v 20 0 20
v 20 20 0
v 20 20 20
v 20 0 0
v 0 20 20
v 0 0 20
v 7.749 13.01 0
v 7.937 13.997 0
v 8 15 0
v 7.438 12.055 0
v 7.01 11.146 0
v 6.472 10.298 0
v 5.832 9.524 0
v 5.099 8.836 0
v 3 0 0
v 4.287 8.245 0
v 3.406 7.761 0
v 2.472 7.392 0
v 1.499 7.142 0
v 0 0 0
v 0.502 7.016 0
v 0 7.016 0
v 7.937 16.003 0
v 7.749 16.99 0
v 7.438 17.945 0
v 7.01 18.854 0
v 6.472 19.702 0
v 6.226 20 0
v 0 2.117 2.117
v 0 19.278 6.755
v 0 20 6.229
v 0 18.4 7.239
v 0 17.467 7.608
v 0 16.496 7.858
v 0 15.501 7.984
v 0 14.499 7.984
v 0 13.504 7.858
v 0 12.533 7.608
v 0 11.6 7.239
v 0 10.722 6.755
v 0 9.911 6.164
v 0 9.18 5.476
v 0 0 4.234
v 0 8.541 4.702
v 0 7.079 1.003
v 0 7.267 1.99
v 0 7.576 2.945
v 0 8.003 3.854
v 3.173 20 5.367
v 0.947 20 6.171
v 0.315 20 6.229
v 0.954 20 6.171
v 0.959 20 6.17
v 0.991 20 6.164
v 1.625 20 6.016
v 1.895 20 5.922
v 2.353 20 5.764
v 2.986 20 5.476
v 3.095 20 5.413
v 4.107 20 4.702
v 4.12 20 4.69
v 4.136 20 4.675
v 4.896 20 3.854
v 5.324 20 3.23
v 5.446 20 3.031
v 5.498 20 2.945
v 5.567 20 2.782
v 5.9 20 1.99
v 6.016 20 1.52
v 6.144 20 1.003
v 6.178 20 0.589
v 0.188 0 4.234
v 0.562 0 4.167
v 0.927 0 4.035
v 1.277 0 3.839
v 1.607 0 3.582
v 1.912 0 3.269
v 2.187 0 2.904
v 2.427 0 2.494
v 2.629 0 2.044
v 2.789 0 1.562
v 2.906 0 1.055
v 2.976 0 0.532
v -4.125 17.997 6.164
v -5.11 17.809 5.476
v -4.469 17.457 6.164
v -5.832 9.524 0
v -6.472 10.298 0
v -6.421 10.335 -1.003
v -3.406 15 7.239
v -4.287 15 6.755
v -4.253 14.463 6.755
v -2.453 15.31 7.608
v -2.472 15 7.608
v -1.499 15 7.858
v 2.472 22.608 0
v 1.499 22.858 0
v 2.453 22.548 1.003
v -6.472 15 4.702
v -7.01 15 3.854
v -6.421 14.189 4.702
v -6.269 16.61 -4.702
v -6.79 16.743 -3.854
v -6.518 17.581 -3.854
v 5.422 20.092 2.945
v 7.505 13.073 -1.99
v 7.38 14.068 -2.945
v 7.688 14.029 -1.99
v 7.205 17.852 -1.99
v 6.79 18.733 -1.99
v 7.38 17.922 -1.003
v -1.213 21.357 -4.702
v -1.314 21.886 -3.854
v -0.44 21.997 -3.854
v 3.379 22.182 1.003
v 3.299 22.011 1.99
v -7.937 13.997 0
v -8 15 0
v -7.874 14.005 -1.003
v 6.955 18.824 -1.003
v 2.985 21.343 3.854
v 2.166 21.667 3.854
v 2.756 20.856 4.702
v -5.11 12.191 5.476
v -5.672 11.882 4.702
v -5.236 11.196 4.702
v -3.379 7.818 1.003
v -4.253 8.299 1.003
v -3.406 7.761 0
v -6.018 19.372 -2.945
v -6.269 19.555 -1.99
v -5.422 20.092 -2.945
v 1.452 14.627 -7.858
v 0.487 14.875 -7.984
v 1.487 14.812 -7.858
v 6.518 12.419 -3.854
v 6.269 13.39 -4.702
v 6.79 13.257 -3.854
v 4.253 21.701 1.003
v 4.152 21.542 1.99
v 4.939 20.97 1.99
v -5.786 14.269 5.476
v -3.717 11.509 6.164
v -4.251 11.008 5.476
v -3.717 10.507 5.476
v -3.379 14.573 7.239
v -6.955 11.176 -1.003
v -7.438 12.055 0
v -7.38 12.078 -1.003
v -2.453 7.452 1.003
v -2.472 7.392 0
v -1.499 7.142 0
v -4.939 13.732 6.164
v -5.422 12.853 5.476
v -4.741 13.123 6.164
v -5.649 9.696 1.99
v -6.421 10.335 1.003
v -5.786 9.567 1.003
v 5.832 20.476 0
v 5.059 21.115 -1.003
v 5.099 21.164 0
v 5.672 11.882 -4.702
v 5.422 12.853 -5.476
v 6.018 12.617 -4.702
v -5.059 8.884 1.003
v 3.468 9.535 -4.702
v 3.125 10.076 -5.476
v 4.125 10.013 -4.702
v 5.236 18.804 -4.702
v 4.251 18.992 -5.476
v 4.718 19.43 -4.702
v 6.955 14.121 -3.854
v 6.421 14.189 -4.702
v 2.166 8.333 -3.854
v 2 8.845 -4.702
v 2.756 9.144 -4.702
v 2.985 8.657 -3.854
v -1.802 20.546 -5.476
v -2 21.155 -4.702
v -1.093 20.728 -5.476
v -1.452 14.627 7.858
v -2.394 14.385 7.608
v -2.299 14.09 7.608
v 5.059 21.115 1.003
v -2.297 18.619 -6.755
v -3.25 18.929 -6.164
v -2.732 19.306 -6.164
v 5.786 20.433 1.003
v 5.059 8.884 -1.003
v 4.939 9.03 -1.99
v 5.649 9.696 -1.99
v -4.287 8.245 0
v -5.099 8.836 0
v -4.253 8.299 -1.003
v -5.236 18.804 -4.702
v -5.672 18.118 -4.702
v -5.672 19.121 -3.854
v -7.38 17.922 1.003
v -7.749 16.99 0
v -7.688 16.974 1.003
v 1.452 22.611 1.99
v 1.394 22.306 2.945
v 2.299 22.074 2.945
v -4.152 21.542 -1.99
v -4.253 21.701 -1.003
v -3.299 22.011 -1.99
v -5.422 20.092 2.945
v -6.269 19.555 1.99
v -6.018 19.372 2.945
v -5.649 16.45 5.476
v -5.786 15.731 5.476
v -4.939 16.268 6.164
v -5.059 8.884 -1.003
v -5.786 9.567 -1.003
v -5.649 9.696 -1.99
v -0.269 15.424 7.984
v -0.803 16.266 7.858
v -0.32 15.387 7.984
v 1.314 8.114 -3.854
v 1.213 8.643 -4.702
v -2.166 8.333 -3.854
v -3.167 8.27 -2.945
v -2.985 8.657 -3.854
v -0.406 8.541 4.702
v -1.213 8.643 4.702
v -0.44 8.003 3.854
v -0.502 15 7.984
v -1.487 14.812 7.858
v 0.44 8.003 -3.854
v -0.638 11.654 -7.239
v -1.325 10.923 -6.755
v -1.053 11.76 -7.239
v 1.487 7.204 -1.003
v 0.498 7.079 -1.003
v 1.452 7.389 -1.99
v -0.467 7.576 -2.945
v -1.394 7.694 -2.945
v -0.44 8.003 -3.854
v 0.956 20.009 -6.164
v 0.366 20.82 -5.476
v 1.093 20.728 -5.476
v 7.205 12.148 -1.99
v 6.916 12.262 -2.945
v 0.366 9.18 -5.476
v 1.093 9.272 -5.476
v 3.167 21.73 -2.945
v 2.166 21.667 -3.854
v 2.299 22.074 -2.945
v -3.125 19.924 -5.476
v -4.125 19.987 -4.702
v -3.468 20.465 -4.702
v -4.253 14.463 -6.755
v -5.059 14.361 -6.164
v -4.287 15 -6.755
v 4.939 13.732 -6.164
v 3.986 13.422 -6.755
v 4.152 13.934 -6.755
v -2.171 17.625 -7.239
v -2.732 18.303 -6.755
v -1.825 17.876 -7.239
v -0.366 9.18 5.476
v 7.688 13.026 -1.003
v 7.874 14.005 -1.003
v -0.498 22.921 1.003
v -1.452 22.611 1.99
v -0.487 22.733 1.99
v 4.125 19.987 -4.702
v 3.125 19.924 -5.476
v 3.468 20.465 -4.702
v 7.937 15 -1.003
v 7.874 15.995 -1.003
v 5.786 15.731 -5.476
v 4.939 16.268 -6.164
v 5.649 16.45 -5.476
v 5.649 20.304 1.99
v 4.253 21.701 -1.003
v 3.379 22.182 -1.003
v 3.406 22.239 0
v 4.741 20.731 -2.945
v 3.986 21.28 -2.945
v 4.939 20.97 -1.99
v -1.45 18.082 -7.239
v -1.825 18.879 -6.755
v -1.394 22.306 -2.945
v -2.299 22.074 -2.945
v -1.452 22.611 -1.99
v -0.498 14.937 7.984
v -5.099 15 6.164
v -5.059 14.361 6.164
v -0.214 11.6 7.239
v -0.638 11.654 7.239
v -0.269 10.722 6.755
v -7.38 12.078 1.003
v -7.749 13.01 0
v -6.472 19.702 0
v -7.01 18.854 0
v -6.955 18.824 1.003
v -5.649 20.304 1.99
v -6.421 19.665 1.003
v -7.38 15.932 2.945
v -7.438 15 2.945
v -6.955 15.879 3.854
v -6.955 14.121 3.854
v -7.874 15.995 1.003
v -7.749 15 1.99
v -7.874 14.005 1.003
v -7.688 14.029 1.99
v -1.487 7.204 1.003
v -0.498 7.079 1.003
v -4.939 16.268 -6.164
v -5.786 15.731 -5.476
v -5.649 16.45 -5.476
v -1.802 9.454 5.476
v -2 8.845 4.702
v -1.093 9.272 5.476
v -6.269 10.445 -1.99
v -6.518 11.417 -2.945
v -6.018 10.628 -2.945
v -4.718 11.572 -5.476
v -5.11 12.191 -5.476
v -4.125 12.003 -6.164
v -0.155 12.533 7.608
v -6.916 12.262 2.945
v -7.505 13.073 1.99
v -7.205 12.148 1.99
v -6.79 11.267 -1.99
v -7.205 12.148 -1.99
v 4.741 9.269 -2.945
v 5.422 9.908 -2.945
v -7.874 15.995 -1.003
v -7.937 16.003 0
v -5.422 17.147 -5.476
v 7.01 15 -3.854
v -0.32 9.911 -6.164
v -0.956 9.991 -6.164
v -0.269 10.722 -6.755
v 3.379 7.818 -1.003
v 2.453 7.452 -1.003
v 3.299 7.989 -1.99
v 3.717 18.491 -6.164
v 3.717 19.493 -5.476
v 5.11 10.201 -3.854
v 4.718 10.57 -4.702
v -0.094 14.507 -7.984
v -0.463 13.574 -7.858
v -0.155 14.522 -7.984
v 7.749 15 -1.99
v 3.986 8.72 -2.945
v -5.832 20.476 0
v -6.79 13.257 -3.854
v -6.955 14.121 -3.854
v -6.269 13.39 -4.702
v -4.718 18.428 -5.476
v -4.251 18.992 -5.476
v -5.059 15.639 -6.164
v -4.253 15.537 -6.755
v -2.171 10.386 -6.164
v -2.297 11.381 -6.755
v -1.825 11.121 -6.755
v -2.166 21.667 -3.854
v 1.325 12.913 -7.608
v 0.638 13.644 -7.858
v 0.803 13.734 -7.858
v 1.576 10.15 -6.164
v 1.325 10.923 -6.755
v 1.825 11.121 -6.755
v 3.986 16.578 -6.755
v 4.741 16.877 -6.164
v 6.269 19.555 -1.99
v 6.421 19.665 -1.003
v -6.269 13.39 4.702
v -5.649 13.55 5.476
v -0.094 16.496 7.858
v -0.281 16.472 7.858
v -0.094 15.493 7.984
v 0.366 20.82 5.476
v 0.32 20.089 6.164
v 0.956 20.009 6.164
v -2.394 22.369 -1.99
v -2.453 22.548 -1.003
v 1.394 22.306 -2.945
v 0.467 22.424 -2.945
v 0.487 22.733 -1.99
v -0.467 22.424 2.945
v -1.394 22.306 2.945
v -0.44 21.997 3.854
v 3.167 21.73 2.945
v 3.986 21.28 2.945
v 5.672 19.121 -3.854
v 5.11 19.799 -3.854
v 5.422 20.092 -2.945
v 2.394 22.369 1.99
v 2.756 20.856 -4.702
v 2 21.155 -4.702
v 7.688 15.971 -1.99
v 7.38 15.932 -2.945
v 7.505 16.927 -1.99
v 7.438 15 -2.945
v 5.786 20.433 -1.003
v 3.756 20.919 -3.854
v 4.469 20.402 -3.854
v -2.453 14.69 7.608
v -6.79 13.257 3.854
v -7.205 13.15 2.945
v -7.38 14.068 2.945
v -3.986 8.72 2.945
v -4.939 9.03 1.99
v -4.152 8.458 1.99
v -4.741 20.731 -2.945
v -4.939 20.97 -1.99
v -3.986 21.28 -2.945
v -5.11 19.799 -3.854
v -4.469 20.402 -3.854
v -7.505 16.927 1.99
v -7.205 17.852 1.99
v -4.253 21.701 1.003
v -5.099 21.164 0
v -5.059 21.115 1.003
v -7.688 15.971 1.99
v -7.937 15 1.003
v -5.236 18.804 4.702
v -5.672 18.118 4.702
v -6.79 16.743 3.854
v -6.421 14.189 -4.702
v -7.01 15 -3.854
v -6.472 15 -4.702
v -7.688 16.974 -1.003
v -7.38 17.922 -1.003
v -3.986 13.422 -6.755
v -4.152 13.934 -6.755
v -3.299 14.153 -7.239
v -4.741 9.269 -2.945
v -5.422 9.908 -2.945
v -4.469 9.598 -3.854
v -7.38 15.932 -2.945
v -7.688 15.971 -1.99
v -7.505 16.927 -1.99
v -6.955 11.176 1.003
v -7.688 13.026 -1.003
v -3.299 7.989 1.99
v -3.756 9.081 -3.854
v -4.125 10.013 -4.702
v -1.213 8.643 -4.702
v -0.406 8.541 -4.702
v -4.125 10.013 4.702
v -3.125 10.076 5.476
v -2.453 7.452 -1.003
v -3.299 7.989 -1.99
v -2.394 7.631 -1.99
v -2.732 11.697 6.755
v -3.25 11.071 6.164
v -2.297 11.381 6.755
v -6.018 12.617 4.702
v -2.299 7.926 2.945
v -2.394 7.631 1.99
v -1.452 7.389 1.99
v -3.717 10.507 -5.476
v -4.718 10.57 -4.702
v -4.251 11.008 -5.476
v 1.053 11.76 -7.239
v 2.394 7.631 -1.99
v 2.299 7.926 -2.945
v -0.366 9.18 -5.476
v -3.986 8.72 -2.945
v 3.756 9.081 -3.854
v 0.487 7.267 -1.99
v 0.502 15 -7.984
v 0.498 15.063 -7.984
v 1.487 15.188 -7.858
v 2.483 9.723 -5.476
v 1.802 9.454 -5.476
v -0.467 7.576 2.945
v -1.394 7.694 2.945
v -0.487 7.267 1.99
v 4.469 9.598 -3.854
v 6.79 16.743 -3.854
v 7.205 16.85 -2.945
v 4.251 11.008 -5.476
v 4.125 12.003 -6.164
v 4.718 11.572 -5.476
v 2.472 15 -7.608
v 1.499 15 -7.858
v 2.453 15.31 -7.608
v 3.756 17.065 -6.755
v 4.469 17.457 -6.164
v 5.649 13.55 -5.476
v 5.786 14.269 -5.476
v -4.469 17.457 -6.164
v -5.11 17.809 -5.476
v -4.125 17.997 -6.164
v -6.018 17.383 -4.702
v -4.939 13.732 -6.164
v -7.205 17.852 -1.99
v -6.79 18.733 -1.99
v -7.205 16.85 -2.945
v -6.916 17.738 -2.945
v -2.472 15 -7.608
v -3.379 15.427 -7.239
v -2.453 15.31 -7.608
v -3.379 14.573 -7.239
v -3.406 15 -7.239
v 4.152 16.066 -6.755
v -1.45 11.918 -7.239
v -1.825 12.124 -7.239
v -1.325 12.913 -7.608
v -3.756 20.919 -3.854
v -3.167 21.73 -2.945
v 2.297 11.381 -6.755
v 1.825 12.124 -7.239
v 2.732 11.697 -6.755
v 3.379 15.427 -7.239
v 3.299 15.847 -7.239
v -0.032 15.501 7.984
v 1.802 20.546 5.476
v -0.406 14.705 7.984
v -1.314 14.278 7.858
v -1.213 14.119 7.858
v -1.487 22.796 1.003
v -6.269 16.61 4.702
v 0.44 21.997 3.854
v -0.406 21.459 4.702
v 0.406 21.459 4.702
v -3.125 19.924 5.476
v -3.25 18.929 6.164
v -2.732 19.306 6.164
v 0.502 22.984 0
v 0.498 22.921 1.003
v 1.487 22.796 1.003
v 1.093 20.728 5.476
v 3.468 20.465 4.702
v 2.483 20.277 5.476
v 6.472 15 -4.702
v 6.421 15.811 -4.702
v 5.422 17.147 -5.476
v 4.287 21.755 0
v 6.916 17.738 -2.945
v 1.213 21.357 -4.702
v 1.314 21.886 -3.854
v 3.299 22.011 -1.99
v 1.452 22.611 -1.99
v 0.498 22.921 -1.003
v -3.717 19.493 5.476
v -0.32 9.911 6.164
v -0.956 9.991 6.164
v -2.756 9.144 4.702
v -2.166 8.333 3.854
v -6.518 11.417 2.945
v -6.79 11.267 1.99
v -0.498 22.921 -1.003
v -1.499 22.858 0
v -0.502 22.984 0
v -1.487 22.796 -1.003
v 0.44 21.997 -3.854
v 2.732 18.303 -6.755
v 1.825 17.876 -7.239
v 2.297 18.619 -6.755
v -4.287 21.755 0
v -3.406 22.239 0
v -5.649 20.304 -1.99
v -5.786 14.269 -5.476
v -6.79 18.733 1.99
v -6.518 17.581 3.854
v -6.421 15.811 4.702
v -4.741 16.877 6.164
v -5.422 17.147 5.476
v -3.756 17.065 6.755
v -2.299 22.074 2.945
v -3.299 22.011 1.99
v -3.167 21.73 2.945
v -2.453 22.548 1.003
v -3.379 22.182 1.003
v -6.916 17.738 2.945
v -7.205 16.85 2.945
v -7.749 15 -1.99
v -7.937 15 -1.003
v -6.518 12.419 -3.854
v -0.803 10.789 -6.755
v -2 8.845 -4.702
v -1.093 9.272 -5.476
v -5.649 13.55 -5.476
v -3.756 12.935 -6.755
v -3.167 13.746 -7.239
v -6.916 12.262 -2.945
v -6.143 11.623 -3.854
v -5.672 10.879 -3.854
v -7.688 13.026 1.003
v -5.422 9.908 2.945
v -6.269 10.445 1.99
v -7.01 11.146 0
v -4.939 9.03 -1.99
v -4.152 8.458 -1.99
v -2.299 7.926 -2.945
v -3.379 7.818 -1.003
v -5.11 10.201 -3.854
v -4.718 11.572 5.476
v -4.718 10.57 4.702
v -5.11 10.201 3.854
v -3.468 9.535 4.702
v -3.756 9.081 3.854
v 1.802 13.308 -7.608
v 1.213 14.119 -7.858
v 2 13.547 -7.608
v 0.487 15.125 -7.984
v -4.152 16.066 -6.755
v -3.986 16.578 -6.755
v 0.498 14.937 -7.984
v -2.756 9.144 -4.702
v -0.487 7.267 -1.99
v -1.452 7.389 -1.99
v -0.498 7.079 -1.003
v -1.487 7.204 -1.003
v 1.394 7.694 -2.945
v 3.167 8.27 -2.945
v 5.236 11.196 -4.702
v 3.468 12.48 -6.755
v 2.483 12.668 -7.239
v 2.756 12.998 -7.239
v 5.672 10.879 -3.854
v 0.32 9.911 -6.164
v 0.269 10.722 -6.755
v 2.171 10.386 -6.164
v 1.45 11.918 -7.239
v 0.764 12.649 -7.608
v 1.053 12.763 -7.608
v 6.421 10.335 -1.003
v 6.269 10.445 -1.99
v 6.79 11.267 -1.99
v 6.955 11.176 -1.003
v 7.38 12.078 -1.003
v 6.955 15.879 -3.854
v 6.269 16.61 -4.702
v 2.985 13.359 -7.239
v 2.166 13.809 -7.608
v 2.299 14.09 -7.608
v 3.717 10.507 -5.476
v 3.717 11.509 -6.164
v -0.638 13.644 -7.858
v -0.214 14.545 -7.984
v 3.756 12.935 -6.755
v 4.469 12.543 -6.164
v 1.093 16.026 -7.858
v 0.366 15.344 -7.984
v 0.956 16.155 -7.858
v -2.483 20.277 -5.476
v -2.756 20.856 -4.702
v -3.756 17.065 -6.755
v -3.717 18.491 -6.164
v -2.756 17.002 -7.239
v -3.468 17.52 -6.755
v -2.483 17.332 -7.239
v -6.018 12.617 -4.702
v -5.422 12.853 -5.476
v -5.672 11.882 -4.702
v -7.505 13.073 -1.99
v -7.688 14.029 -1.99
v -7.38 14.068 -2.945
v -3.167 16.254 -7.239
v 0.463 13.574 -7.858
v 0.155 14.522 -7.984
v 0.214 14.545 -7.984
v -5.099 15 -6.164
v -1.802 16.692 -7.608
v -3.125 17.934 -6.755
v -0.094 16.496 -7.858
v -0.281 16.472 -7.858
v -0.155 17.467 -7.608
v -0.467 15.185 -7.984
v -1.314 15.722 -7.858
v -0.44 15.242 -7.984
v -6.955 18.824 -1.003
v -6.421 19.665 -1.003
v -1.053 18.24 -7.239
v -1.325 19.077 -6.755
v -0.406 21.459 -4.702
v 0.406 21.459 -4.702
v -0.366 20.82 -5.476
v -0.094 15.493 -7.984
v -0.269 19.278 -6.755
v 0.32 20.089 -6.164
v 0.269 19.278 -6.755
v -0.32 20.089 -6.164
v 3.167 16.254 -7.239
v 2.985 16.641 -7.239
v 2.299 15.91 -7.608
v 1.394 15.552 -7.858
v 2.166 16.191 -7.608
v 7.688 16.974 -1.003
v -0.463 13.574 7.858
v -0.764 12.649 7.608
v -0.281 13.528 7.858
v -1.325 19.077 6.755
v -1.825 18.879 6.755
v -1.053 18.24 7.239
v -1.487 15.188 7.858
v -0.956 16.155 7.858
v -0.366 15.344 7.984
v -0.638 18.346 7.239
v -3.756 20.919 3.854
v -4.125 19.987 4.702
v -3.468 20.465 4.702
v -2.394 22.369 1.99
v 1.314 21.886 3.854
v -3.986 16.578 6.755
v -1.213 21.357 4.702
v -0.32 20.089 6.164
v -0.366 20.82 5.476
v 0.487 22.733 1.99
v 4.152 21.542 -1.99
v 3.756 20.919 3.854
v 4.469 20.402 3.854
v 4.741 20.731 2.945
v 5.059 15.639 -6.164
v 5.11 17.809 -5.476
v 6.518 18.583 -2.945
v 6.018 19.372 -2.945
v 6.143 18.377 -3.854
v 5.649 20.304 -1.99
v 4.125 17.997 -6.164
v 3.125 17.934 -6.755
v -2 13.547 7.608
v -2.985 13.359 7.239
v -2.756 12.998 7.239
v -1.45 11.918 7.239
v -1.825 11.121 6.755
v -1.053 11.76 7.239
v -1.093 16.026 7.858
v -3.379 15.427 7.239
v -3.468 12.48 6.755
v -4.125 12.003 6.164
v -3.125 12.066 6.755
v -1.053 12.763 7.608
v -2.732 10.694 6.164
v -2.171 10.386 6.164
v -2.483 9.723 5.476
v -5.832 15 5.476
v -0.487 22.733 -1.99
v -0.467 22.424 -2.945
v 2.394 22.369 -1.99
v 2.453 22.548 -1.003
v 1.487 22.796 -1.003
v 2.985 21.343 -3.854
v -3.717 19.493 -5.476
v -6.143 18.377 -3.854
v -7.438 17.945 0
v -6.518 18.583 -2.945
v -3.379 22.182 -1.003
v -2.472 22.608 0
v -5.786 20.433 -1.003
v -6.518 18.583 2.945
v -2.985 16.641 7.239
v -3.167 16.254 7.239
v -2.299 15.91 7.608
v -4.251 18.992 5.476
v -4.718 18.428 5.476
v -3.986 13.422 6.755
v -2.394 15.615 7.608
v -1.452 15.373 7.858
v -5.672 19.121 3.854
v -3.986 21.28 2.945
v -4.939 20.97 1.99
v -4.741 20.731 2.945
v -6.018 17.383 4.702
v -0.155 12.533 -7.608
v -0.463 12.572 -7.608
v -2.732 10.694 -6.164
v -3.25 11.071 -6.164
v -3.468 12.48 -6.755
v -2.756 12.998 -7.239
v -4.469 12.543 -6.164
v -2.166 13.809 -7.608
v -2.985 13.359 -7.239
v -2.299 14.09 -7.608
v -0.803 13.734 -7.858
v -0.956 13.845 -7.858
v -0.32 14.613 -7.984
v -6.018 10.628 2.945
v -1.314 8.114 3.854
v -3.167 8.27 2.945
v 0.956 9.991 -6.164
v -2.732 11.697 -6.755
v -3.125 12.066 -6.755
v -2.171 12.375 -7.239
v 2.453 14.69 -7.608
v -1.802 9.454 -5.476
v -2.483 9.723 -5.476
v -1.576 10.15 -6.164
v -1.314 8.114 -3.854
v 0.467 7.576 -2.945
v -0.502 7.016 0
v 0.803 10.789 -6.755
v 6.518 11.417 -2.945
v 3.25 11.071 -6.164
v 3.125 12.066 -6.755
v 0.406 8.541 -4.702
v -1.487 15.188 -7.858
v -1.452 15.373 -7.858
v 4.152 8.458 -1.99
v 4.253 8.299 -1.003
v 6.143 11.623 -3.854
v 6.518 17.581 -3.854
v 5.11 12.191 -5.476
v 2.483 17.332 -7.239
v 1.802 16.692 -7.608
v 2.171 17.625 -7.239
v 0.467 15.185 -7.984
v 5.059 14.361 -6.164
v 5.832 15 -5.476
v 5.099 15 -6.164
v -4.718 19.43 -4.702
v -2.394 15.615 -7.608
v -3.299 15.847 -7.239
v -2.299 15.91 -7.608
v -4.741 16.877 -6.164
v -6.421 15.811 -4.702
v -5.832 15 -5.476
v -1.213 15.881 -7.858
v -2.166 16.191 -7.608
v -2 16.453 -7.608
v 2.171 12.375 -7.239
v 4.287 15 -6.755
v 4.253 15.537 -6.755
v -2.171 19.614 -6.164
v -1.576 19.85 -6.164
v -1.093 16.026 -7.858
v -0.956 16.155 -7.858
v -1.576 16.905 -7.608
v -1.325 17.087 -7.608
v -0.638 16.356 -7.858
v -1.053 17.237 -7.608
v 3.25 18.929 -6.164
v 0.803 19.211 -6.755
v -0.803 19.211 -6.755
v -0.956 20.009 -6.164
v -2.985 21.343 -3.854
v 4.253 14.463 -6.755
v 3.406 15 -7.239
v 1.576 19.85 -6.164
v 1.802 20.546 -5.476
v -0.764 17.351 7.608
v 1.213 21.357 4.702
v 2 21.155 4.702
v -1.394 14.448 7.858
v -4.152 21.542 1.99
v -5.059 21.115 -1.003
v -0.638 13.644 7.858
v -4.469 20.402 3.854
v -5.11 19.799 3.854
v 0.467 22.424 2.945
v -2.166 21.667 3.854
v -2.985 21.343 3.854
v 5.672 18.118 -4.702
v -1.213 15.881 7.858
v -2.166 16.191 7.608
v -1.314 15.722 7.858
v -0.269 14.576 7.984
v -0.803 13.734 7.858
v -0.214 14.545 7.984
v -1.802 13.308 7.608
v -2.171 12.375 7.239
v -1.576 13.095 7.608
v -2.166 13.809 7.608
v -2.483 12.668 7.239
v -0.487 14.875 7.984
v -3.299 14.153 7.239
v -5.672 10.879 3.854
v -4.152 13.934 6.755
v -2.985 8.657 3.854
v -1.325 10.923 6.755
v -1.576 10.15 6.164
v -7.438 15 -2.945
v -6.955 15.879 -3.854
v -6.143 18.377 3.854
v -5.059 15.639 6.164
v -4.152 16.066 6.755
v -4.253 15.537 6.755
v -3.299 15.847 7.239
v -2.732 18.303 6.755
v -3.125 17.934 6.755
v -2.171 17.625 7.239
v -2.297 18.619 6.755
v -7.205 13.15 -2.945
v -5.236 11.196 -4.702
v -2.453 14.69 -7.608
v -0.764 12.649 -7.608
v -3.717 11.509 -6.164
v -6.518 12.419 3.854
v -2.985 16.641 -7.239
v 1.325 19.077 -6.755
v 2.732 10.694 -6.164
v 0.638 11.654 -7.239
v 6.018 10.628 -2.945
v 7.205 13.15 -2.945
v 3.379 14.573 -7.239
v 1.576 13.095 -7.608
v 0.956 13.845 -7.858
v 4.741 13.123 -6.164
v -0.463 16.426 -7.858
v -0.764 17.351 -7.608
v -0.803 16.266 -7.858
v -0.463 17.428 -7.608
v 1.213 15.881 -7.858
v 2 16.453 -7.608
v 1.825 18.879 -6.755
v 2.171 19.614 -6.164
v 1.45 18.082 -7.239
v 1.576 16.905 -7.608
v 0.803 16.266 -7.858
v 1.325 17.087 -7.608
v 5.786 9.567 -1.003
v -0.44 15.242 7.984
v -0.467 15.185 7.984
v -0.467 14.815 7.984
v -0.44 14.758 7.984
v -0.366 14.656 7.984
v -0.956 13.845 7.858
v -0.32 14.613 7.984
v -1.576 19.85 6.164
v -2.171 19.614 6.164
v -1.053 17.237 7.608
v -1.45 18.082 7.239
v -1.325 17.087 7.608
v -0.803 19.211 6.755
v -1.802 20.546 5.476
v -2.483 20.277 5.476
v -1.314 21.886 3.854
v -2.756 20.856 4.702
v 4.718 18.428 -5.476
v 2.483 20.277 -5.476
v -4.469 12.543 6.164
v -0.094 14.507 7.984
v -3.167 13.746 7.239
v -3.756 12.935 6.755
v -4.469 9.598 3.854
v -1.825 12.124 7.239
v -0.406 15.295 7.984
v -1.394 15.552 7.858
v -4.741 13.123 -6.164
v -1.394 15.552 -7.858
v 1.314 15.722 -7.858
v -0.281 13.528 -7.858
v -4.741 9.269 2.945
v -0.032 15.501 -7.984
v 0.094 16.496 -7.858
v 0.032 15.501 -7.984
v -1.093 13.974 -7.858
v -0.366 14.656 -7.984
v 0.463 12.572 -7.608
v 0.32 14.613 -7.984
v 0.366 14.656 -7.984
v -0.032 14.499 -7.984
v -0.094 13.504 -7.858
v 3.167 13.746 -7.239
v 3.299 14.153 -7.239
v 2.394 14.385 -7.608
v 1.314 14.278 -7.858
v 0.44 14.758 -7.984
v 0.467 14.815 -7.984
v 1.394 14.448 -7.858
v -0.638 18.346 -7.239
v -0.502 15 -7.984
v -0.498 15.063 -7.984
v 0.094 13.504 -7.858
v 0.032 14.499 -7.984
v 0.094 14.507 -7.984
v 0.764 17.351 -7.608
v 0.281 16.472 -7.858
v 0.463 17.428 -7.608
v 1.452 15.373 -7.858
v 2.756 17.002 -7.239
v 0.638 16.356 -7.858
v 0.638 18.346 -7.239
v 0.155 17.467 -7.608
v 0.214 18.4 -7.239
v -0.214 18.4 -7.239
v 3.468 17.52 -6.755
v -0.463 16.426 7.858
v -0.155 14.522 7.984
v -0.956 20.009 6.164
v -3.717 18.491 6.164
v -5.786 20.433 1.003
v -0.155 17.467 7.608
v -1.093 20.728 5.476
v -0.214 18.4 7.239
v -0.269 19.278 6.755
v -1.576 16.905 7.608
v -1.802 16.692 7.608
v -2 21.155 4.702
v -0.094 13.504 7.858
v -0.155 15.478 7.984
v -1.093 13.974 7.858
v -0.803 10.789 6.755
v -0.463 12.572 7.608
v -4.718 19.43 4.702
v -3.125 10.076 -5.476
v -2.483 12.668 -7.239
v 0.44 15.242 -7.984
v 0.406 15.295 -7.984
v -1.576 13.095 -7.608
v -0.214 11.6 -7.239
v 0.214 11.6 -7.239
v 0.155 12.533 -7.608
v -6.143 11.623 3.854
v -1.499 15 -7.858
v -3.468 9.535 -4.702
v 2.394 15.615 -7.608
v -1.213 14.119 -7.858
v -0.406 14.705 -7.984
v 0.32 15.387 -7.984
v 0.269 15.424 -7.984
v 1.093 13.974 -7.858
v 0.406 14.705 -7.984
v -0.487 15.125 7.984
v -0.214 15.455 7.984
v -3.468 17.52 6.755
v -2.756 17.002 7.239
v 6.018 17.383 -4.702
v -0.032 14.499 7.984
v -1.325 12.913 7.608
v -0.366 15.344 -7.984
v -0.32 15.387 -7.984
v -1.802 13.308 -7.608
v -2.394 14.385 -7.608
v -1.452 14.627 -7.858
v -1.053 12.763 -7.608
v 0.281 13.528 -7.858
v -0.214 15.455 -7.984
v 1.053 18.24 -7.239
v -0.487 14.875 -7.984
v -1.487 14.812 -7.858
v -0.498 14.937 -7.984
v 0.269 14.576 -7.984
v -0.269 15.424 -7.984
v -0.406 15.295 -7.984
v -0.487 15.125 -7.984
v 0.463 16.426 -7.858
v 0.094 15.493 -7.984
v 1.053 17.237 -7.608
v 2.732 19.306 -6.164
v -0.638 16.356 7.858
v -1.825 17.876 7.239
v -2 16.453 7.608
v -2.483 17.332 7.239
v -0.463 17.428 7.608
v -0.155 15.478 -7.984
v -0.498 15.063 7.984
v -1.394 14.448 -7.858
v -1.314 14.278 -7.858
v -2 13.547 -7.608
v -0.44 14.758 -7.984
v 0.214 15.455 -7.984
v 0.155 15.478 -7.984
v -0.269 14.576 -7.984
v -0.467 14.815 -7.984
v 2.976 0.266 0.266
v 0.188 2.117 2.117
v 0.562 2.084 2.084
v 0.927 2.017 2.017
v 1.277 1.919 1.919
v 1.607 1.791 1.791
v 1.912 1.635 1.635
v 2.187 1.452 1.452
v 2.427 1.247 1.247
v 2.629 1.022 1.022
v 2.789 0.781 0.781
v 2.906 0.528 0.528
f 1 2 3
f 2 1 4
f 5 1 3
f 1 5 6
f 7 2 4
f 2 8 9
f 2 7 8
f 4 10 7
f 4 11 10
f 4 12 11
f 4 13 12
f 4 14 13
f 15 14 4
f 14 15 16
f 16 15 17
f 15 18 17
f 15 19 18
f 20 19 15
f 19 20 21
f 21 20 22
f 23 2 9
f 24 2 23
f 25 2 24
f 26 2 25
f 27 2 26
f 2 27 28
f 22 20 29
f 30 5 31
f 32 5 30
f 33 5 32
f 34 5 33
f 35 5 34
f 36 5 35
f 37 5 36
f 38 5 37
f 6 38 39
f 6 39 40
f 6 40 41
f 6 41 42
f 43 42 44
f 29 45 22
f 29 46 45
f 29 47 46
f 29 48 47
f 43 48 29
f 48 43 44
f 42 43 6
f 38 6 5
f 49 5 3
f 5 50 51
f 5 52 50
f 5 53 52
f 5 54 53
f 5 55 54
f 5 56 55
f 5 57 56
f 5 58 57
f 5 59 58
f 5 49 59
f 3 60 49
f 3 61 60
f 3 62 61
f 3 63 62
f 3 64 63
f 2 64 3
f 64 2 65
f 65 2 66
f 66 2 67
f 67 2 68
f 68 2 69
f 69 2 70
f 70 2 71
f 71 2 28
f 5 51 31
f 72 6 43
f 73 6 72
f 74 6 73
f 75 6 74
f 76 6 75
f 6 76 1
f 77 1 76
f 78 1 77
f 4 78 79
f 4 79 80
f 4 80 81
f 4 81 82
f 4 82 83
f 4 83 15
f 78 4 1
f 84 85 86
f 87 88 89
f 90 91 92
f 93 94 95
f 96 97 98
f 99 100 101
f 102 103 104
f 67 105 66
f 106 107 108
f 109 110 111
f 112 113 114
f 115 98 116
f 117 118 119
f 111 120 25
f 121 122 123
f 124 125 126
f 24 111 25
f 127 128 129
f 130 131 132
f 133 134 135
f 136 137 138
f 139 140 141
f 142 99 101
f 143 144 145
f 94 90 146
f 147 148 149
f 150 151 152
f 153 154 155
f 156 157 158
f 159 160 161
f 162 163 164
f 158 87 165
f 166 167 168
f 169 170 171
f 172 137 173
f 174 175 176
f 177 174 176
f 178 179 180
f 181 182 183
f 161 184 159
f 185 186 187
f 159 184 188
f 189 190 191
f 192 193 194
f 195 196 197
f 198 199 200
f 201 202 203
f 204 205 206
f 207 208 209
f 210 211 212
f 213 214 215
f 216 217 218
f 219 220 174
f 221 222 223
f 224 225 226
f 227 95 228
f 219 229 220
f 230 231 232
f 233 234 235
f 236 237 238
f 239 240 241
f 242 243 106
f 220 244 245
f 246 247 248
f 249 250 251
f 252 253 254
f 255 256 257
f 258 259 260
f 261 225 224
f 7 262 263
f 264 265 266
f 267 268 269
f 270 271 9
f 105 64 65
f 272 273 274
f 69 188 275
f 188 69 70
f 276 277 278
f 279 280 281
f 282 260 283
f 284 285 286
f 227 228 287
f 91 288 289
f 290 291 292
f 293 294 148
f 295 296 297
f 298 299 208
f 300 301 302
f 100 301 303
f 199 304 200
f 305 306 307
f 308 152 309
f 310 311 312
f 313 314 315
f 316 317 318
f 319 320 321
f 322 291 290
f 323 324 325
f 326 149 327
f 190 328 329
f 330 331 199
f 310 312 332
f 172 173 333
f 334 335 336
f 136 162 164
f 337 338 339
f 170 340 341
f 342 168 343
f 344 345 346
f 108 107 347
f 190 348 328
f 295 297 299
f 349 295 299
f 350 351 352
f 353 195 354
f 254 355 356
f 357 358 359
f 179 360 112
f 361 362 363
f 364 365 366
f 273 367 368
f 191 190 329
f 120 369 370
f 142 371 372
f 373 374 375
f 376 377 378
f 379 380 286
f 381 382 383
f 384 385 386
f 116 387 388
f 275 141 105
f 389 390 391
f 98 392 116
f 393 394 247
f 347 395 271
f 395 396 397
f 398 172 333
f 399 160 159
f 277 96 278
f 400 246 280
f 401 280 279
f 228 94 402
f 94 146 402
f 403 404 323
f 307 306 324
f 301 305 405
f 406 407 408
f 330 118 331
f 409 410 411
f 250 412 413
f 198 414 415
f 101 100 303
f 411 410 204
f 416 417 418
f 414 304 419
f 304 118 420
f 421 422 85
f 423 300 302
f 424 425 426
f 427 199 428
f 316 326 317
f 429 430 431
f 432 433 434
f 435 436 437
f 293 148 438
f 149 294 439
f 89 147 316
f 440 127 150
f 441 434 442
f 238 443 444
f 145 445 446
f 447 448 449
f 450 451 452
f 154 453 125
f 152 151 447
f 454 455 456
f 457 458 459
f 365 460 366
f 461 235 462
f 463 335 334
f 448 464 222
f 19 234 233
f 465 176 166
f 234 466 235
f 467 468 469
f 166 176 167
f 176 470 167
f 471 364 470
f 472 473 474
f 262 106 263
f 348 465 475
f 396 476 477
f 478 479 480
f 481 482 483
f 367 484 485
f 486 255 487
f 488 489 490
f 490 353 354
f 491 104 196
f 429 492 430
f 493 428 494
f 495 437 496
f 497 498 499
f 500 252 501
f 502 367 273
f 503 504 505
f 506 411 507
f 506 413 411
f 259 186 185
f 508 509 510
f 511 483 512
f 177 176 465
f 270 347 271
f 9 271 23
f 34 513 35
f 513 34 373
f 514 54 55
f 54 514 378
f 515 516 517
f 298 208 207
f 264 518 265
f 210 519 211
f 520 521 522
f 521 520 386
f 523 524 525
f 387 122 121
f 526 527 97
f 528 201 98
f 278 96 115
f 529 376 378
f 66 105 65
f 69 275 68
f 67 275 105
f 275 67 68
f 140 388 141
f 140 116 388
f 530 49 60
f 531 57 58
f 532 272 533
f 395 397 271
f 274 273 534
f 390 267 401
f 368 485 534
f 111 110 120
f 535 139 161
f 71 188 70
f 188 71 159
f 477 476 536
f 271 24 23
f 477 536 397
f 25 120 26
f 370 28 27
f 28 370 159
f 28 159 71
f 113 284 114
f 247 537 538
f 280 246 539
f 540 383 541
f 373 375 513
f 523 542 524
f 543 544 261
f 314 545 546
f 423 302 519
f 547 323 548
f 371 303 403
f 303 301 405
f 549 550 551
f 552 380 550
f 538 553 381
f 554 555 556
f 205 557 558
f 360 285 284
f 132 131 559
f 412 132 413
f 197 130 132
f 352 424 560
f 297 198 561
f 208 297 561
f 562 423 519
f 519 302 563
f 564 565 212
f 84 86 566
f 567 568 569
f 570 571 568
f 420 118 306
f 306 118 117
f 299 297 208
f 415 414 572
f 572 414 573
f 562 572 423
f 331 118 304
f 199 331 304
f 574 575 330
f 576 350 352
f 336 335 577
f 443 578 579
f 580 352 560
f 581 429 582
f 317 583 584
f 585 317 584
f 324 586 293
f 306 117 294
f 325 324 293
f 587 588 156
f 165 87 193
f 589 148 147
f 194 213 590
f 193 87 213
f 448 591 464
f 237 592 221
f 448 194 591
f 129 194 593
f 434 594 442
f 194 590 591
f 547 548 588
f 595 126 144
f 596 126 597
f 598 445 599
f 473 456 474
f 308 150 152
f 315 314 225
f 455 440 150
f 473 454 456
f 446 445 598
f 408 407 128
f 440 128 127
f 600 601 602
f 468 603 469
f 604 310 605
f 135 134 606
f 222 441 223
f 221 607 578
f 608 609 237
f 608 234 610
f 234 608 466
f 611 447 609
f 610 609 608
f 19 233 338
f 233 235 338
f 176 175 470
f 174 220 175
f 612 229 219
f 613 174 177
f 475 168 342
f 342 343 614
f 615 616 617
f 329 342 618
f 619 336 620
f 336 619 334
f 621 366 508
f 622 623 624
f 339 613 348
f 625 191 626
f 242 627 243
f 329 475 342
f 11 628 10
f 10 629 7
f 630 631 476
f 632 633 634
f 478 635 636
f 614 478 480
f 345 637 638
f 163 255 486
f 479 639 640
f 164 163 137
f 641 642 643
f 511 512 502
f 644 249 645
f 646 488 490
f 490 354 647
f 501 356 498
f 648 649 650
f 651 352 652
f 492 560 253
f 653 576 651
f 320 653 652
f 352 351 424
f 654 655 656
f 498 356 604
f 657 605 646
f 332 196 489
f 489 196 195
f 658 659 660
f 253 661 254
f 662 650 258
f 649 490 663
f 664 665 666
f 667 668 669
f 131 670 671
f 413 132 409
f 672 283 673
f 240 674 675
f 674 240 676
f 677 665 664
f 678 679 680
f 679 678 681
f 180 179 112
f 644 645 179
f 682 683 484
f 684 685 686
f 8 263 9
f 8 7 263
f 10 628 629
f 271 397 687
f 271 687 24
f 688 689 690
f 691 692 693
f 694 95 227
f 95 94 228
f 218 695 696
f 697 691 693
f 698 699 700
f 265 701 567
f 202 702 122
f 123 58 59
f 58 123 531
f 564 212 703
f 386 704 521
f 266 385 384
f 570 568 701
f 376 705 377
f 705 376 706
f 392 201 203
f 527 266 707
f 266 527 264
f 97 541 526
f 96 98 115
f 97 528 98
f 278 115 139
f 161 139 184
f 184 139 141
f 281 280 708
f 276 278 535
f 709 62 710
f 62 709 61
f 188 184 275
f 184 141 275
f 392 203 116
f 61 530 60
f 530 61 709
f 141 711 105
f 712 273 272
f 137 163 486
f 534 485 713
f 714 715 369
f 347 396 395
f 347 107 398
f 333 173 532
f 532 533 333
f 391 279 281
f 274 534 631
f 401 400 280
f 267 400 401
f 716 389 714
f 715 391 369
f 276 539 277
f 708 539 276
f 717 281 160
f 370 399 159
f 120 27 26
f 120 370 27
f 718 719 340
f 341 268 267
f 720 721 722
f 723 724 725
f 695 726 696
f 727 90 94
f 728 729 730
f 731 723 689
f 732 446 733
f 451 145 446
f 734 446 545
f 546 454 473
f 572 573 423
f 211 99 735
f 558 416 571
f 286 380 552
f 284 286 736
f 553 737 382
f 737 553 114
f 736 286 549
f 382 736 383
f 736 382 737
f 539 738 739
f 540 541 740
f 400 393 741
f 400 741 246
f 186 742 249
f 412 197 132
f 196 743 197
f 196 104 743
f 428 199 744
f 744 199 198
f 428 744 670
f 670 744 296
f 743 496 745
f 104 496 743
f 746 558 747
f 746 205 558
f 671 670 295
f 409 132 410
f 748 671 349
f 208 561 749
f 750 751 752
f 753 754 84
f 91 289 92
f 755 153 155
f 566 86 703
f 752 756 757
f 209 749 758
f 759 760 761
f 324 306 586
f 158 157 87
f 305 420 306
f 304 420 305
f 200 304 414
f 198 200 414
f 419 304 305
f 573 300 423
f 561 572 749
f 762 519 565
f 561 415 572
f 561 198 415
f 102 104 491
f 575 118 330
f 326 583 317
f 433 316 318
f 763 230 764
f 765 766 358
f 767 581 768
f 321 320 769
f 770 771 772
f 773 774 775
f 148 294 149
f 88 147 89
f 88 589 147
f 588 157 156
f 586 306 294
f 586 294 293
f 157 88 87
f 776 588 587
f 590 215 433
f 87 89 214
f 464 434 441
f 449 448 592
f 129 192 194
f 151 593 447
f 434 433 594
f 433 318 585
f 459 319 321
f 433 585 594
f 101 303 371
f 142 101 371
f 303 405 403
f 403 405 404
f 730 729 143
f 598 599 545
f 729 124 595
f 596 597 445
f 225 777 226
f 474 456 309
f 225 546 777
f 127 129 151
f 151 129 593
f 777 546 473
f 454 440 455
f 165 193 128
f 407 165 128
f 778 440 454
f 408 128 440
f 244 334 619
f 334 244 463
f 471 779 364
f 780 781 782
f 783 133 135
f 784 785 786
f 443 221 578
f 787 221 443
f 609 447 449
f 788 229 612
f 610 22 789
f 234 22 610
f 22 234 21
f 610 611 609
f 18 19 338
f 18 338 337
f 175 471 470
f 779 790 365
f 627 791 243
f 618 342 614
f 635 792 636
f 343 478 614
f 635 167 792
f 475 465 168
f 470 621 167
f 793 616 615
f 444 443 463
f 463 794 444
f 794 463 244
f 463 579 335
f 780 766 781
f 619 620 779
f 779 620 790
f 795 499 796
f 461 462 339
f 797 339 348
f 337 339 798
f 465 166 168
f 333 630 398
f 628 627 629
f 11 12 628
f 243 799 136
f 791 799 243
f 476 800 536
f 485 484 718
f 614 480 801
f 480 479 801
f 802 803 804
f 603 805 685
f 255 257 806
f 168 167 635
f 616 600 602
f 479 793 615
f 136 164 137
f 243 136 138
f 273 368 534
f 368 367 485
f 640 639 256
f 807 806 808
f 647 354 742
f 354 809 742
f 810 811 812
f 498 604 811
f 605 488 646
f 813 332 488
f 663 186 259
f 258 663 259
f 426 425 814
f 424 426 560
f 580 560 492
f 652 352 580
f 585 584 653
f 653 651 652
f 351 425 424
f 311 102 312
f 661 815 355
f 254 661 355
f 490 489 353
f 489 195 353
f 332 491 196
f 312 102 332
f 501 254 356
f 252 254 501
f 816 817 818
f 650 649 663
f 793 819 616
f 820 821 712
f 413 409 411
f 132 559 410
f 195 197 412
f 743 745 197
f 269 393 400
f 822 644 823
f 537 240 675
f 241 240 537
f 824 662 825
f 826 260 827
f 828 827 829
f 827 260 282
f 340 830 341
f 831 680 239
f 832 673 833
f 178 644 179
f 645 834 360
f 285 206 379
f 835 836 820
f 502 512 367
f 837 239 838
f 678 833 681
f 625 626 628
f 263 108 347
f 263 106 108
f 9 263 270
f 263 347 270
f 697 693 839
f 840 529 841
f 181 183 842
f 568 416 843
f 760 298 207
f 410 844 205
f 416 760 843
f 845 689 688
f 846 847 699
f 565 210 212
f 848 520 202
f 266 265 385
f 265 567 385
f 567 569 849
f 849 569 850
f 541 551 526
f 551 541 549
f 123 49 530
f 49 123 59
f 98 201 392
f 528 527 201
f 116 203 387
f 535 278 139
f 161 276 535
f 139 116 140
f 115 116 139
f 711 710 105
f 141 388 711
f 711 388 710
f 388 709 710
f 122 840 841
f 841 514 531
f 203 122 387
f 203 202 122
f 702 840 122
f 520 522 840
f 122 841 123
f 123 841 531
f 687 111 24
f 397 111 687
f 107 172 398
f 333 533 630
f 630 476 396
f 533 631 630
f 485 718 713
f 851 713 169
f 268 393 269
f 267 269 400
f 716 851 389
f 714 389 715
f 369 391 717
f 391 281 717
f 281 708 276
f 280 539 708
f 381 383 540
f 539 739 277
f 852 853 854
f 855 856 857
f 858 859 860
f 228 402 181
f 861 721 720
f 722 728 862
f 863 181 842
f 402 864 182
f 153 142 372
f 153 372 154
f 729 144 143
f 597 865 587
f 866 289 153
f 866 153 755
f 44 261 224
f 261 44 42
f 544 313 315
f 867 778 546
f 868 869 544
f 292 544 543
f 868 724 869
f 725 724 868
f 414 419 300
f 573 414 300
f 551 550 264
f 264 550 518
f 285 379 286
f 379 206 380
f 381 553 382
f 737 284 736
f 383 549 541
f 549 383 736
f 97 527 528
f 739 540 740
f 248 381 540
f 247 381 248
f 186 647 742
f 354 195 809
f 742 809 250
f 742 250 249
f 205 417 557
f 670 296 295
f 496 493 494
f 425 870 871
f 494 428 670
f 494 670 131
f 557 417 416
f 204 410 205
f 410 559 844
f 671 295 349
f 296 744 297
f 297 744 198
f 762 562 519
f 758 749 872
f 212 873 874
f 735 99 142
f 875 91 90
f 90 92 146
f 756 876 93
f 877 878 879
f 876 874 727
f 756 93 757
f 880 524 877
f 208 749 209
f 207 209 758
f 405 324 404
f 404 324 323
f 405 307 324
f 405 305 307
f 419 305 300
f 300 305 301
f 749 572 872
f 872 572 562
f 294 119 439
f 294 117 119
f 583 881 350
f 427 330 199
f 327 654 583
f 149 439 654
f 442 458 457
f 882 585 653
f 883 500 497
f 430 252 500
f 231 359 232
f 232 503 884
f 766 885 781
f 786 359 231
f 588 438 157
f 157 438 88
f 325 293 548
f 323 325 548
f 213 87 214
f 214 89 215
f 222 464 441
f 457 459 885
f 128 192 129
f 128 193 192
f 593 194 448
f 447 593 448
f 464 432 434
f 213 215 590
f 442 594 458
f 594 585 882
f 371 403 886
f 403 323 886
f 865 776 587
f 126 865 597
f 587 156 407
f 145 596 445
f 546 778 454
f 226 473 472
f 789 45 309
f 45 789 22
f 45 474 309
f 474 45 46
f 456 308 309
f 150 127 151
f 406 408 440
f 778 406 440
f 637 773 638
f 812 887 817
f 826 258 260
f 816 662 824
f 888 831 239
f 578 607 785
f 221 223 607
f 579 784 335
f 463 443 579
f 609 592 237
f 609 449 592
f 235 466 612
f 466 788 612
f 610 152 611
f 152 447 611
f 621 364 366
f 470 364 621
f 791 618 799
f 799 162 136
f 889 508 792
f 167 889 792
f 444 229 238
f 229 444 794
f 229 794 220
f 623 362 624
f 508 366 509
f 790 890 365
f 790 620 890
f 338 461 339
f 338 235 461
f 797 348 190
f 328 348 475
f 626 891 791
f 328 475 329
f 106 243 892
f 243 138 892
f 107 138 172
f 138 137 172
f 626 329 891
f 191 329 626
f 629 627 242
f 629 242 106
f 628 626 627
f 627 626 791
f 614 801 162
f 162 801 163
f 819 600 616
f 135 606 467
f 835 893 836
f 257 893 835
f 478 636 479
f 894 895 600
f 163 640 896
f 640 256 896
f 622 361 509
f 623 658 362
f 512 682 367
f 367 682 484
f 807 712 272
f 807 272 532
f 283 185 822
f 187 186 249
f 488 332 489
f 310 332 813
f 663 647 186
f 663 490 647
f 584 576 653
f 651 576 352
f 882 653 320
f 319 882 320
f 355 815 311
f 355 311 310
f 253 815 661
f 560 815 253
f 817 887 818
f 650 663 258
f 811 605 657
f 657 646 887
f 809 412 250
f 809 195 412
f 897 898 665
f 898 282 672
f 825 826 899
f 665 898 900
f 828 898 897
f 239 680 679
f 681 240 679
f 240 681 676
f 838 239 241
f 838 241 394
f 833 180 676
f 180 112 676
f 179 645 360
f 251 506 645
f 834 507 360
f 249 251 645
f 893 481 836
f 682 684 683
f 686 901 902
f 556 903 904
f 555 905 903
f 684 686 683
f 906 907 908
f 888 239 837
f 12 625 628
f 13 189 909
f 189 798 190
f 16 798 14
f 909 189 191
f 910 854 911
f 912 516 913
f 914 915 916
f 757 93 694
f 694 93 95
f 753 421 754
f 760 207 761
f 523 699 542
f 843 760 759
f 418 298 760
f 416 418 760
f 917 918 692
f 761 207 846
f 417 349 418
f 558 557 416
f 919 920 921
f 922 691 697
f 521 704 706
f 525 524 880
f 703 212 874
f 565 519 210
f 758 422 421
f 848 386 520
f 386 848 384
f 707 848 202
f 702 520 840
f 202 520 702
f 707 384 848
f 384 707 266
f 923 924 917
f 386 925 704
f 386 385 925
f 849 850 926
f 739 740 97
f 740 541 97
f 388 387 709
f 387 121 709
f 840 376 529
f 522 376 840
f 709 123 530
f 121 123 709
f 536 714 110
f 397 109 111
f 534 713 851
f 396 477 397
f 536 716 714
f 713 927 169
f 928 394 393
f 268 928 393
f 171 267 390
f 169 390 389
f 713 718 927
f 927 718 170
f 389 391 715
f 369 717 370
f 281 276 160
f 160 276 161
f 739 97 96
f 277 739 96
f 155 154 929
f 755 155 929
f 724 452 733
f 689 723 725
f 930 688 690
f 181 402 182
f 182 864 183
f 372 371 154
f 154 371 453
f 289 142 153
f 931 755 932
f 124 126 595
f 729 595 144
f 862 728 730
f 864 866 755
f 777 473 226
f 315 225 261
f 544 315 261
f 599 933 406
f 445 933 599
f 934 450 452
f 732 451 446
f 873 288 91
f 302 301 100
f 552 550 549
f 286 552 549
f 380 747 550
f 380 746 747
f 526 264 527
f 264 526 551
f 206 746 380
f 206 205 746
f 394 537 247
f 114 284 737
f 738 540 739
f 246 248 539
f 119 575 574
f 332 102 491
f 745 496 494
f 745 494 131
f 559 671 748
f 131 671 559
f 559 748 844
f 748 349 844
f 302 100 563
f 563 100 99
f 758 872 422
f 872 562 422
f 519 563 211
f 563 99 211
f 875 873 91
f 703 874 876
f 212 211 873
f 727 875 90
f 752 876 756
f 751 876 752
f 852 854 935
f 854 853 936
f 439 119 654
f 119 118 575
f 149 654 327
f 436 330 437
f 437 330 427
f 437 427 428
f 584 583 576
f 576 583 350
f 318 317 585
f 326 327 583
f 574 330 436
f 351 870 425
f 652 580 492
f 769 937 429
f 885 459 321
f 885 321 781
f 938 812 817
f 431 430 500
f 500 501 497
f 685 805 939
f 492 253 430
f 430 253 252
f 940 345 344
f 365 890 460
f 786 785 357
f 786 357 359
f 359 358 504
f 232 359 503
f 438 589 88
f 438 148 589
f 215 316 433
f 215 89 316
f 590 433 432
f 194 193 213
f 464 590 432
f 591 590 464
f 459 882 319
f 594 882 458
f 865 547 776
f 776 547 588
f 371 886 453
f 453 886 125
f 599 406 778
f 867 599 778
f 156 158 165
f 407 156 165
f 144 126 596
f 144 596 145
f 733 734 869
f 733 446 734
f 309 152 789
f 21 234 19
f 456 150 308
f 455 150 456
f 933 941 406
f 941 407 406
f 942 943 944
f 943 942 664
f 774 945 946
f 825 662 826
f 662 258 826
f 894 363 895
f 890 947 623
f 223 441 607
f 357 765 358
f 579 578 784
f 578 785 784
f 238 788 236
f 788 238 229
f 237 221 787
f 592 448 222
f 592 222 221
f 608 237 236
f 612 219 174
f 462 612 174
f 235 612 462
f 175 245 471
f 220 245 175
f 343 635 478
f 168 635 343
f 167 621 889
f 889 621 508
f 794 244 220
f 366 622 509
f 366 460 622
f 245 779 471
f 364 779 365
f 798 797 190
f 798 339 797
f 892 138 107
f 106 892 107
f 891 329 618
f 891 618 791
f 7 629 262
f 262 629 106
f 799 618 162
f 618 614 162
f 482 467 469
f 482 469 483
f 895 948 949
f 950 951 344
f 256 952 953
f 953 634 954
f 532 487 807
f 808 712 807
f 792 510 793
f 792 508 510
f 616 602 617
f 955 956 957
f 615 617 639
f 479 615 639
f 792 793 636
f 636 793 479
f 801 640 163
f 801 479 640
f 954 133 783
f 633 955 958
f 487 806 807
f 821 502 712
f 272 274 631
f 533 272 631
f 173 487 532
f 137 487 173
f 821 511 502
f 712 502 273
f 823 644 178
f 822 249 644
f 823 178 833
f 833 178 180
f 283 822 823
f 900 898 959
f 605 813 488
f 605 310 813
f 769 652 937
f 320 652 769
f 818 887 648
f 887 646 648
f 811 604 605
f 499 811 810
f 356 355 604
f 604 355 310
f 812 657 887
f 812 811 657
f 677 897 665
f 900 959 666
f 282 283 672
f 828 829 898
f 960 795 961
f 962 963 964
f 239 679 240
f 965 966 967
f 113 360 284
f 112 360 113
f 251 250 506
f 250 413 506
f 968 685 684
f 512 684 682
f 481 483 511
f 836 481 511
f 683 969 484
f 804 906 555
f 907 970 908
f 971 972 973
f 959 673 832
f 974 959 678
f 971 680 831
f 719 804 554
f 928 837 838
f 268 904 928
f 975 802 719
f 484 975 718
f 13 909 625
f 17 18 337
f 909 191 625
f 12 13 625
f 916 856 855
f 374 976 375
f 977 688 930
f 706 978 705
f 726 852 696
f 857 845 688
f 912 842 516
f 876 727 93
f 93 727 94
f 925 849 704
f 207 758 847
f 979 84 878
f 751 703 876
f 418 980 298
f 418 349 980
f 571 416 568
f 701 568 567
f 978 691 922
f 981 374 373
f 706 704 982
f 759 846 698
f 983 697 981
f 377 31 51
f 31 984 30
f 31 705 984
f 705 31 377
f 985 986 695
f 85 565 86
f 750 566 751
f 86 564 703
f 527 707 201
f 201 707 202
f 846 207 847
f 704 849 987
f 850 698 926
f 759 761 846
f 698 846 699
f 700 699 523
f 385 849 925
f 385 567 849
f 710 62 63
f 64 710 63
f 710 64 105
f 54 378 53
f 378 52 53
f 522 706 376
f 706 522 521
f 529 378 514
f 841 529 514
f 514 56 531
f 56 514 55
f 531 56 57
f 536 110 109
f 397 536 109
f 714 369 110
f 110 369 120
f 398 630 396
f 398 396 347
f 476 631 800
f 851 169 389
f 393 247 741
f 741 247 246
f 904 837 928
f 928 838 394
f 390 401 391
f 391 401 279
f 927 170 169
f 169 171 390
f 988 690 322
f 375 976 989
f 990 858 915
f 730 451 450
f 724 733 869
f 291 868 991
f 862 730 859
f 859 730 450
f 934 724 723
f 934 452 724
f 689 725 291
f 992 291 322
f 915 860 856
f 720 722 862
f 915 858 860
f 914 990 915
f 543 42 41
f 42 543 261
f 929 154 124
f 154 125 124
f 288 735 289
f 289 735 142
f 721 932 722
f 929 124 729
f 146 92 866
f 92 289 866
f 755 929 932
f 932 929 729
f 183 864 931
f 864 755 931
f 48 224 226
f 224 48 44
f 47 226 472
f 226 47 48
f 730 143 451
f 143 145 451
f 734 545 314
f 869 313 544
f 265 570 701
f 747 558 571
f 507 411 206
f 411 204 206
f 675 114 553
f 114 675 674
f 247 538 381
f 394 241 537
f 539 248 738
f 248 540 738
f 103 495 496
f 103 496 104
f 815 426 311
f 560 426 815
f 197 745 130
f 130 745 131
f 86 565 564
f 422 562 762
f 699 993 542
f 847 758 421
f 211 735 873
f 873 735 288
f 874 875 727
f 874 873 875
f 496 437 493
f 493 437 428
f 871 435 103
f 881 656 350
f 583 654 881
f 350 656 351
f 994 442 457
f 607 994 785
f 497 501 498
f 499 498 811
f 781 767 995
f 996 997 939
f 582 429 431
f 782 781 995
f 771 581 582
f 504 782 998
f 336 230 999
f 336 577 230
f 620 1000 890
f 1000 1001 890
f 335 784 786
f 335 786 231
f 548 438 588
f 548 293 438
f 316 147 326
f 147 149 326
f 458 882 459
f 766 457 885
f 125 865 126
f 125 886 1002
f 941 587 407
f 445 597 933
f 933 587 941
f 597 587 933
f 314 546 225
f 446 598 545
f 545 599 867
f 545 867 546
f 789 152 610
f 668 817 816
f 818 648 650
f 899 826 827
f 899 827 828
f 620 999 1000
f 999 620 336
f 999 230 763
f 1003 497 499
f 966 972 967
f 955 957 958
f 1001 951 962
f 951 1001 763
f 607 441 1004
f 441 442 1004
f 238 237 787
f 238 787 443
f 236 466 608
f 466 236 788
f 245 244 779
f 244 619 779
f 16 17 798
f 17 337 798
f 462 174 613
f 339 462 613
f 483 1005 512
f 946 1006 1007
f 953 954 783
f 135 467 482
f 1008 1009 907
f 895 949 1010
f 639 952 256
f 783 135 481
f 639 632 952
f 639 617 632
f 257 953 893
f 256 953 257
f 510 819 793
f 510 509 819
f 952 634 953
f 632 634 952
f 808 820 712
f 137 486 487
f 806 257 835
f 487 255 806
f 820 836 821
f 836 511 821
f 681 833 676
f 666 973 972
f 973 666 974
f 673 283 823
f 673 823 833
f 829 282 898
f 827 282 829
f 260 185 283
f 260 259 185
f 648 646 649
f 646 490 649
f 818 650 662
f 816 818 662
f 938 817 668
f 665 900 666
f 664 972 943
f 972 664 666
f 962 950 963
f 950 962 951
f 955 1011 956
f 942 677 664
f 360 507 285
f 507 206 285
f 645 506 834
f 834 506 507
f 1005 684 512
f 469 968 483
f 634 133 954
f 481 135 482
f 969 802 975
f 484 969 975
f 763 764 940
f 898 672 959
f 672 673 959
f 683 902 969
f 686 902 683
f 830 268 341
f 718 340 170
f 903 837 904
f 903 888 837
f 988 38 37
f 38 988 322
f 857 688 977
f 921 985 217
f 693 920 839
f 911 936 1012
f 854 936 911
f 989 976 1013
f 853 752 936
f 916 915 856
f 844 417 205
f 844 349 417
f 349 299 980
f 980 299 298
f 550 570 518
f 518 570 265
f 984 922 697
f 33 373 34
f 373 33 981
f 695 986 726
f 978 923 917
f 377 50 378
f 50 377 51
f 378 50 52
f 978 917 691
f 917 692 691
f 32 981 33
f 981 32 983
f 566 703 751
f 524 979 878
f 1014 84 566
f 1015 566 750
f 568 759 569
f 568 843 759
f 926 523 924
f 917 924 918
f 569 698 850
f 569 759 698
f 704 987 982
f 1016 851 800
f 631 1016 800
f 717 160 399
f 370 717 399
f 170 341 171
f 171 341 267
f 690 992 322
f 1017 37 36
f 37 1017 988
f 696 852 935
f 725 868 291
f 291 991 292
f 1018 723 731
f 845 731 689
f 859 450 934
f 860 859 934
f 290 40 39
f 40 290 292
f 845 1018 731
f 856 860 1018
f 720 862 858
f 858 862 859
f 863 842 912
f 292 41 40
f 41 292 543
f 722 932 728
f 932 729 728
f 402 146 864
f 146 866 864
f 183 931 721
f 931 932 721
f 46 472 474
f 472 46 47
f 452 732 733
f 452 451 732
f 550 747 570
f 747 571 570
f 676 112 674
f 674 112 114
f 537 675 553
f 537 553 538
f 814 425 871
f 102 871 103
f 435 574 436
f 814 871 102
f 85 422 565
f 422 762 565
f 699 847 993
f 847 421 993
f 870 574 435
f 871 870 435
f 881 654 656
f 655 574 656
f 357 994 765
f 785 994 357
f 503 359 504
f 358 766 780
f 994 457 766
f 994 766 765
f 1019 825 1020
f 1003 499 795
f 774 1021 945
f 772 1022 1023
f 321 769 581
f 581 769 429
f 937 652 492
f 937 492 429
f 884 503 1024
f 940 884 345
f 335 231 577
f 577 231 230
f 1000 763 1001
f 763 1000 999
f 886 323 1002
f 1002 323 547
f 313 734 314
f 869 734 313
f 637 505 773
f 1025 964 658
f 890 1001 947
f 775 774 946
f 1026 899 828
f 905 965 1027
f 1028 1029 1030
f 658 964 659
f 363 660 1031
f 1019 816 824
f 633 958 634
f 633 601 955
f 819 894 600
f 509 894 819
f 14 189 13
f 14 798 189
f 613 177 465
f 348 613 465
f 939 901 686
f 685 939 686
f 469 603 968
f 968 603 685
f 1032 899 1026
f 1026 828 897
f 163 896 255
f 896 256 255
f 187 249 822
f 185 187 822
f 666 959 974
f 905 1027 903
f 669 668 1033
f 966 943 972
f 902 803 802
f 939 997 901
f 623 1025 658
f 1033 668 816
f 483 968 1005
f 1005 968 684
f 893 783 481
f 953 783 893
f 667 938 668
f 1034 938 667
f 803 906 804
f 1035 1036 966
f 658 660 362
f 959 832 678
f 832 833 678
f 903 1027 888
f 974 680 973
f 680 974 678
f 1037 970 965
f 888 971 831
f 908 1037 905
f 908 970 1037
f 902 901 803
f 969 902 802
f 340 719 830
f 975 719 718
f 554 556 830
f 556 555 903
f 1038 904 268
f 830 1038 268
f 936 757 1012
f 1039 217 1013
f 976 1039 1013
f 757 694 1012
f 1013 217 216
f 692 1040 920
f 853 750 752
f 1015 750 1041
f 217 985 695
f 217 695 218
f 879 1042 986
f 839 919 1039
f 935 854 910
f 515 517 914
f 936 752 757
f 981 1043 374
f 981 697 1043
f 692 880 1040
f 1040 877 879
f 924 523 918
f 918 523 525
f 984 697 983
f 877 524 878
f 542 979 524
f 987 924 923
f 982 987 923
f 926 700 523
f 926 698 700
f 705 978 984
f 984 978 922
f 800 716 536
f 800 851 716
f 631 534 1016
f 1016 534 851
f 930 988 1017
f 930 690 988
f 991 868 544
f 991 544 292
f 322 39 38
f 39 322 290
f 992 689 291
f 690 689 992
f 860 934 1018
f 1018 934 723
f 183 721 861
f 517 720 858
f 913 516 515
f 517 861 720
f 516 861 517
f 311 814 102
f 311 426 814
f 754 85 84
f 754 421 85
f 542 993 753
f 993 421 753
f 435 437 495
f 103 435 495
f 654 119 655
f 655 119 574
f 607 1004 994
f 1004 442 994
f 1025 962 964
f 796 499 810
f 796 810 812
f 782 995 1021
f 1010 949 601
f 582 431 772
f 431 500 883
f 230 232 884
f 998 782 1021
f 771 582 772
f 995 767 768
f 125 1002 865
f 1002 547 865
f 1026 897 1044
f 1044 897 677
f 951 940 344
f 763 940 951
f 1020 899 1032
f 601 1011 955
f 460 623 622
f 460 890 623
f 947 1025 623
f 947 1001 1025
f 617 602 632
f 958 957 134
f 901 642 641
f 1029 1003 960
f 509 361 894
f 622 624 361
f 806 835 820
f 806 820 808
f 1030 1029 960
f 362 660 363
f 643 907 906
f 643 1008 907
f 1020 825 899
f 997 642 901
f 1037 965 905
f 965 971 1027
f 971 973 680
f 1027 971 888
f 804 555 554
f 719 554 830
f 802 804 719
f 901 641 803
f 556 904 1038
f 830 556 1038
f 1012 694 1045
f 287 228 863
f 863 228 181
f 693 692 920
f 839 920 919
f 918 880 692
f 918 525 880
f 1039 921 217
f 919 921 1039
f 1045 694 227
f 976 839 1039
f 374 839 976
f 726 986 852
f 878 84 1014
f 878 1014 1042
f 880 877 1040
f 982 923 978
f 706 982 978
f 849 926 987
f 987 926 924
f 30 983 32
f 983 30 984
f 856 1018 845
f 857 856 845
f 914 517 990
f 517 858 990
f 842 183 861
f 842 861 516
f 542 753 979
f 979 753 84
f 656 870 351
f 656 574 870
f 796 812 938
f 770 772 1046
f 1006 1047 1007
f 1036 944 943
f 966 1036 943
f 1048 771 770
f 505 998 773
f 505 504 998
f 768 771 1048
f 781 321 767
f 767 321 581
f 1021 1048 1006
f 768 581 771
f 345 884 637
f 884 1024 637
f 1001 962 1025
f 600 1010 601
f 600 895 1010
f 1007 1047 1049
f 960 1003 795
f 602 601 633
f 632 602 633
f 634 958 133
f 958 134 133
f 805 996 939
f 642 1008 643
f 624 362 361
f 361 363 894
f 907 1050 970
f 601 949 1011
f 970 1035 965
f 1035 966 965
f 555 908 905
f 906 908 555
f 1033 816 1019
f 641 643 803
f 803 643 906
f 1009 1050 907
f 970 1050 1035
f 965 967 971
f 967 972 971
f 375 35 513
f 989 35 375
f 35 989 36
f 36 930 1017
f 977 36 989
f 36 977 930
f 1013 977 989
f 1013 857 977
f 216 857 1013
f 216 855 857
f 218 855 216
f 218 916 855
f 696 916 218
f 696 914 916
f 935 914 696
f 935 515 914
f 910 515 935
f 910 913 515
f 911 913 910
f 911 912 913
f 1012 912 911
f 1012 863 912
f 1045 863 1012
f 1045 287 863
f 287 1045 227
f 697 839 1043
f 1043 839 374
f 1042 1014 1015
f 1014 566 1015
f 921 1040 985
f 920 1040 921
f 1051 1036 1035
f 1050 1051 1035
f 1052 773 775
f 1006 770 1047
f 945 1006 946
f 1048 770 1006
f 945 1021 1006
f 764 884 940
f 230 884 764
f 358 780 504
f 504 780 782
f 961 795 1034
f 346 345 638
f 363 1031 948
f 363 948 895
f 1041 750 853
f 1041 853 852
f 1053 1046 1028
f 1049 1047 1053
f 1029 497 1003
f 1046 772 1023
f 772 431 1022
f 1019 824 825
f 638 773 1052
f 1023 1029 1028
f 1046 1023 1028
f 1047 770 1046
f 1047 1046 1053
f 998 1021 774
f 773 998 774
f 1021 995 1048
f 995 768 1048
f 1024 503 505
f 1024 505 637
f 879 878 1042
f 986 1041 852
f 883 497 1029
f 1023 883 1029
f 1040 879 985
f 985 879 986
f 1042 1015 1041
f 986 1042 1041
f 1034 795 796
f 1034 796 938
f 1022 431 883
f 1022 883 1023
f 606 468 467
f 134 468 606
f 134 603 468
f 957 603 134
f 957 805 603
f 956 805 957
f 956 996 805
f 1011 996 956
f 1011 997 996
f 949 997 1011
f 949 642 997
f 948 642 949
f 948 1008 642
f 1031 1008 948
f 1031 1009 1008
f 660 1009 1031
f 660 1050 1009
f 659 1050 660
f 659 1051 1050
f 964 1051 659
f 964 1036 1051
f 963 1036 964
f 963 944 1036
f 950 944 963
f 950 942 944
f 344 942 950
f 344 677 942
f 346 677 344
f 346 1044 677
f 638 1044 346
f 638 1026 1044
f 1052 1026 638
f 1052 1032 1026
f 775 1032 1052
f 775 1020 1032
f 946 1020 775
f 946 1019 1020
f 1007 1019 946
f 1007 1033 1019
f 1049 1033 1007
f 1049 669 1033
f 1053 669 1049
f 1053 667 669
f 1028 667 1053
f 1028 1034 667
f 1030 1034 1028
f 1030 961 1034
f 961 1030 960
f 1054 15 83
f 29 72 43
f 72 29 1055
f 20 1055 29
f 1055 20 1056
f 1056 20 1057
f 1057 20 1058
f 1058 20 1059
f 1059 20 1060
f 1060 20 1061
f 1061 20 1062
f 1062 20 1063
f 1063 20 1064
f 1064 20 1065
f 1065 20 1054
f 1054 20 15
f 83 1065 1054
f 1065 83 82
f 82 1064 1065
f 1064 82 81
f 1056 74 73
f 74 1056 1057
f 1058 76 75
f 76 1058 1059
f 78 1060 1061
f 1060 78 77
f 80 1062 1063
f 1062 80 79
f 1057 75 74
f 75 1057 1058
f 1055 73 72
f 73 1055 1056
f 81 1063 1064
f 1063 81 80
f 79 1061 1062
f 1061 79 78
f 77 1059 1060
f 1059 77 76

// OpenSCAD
difference() {
  union() {
    cube([20.0, 20.0, 20.0]);
    translate([0, 15.0, 0]) {
      sphere(8.0);
    }
  }
  rotate([45.0, 0, 0]) {
    cylinder(h = 25.0, r = 3.0);
  }
}
$fn = 50;
